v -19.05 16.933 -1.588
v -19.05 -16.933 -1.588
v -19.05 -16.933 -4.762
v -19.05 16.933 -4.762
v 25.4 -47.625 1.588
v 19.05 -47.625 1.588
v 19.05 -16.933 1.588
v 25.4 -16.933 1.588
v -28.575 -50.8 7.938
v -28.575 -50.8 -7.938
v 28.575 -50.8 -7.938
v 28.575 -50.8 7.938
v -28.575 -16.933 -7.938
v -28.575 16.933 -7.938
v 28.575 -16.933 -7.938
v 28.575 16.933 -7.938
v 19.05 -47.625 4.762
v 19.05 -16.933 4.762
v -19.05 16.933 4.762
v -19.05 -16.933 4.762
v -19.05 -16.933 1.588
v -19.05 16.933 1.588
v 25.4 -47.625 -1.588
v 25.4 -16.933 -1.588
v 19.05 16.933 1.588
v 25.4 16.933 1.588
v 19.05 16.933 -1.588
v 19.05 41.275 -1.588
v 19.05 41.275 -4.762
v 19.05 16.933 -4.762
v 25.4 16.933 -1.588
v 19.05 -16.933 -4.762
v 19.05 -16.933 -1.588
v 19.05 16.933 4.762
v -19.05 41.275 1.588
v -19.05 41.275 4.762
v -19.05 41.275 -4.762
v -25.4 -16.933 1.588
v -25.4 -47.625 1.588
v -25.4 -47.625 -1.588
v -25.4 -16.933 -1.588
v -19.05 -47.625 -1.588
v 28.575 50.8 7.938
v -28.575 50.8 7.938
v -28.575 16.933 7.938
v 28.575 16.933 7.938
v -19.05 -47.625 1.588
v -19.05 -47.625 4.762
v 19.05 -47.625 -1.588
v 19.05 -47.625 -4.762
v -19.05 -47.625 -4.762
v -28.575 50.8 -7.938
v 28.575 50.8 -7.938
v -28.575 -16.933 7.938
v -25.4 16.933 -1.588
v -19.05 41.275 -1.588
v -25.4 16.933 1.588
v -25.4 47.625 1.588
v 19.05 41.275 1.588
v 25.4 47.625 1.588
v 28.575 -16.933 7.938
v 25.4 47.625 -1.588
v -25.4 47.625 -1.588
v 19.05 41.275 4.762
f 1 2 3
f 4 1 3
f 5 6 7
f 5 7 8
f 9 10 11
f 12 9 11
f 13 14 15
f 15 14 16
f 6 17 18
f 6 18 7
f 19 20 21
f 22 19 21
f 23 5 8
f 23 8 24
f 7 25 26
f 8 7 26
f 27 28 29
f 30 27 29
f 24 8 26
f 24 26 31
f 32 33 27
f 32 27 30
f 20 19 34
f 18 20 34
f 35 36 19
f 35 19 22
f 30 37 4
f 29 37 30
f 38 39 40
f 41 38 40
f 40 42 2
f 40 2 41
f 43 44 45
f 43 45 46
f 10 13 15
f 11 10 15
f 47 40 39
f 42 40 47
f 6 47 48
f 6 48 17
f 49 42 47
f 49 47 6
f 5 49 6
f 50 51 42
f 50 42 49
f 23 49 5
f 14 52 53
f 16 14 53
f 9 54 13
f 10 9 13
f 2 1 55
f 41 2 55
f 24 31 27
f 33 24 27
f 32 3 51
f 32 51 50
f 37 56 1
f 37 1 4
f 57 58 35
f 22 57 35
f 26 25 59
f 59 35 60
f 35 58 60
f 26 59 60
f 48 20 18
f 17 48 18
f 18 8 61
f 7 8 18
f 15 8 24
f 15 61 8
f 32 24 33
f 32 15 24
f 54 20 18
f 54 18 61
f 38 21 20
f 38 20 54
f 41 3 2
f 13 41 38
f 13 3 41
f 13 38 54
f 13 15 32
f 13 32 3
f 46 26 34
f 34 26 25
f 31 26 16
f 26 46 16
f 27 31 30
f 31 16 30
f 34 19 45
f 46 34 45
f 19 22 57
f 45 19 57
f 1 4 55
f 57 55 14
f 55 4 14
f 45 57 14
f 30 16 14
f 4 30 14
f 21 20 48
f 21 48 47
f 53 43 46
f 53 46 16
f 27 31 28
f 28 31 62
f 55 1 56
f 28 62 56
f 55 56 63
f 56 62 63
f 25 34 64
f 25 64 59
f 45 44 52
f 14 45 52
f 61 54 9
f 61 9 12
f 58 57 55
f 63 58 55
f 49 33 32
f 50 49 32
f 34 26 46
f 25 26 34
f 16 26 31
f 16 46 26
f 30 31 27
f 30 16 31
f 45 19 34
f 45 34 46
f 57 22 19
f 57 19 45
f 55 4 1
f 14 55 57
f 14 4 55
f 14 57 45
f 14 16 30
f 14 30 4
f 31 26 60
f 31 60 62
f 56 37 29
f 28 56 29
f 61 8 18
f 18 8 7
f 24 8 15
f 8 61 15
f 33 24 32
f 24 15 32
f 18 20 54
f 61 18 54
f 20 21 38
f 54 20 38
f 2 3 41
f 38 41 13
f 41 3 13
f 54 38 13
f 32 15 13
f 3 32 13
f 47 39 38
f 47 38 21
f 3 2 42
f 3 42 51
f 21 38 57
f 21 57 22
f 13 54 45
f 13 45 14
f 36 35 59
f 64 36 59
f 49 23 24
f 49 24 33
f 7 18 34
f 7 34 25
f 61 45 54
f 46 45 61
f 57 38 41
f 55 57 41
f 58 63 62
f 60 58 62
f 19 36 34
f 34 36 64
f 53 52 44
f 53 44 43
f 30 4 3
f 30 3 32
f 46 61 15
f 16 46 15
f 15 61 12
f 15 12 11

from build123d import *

# Parameters (mm, degrees)
SKETCH1_W                = 57.15
SKETCH1_H                = 15.875
BOSS_EXTRUDE1_DEPTH      = 50.8
SKETCH2_W                = 6.35
SKETCH2_H                = 3.175
SKETCH2_W_2              = 38.1
CUT_EXTRUDE1_DEPTH       = 47.625
SKETCH2_3_W              = 6.35
SKETCH2_3_H              = 3.175
SKETCH2_3_W_2            = 38.1
CUT_EXTRUDE2_DEPTH       = 47.625
SKETCH2_4_W              = 38.1
SKETCH2_4_H              = 3.175
CUT_EXTRUDE3_DEPTH       = 41.275
SPLIT3_SURFACE_1_1_BACK  = 118.646
SPLIT3_SURFACE_1_1_DEPTH = 237.292
SPLIT3_SURFACE_1_2_BACK  = 118.646
SPLIT3_SURFACE_1_2_DEPTH = 237.292
SPLIT3_SURFACE_2_3_BACK  = 118.646
SPLIT3_SURFACE_2_3_DEPTH = 237.292
SPLIT3_SURFACE_2_4_BACK  = 118.646
SPLIT3_SURFACE_2_4_DEPTH = 237.292


with BuildPart() as part:
    # Sketch1 → Boss-Extrude1 (new, symmetric)
    with BuildSketch(Plane(origin=(0, 0, 0), x_dir=(1, 0, 0), z_dir=(0, 1, 0))):
        Rectangle(SKETCH1_W, SKETCH1_H)
    extrude(amount=BOSS_EXTRUDE1_DEPTH, both=True)

    # Sketch2 → Cut-Extrude1 (cut)
    with BuildSketch(Plane(origin=(0, 0, 0), x_dir=(1, 0, 0), z_dir=(0, 1, 0))):
        with Locations((-22.225, 0)):
            Rectangle(SKETCH2_W, SKETCH2_H)
        Rectangle(SKETCH2_W_2, SKETCH2_H)
        with Locations((0, 3.175)):
            Rectangle(SKETCH2_W_2, SKETCH2_H)
        with Locations((0, -3.175)):
            Rectangle(SKETCH2_W_2, SKETCH2_H)
        with Locations((22.225, 0)):
            Rectangle(SKETCH2_W, SKETCH2_H)
    extrude(amount=-CUT_EXTRUDE1_DEPTH, mode=Mode.SUBTRACT)

    # Sketch2<3> → Cut-Extrude2 (cut)
    with BuildSketch(Plane(origin=(0, 0, 0), x_dir=(1, 0, 0), z_dir=(0, 1, 0))):
        with Locations((-22.225, 0)):
            Rectangle(SKETCH2_3_W, SKETCH2_3_H)
        Rectangle(SKETCH2_3_W_2, SKETCH2_3_H)
        with Locations((22.225, 0)):
            Rectangle(SKETCH2_3_W, SKETCH2_3_H)
    extrude(amount=CUT_EXTRUDE2_DEPTH, mode=Mode.SUBTRACT)

    # Sketch2<4> → Cut-Extrude3 (cut)
    with BuildSketch(Plane(origin=(0, 0, 0), x_dir=(1, 0, 0), z_dir=(0, 1, 0))):
        with Locations((0, -3.175)):
            Rectangle(SKETCH2_4_W, SKETCH2_4_H)
        with Locations((0, 3.175)):
            Rectangle(SKETCH2_4_W, SKETCH2_4_H)
    extrude(amount=CUT_EXTRUDE3_DEPTH, mode=Mode.SUBTRACT)


with BuildPart() as body_2:
    # Split3: the piece behind the surface
    add(part.part)
    # Split3 surface 1: a surface, the sketch's curves swept straight by 237.292 mm
    with BuildLine(Plane.XY.offset(-SPLIT3_SURFACE_1_1_BACK), mode=Mode.PRIVATE) as split3_surface_1_1_path:
        Line((28.575, 16.933333333), (-28.575, 16.933333333))
    split3_surface_1_1 = Shell.extrude(split3_surface_1_1_path.wire(), (0 * SPLIT3_SURFACE_1_1_DEPTH, 0 * SPLIT3_SURFACE_1_1_DEPTH, 1 * SPLIT3_SURFACE_1_1_DEPTH))
    split(bisect_by=split3_surface_1_1, keep=Keep.BOTTOM)


with BuildPart() as part_1:
    add(part.part)

    # Split3: split by a surface, the side it looks to stays
    # Split3 surface 1: a surface, the sketch's curves swept straight by 237.292 mm
    with BuildLine(Plane.XY.offset(-SPLIT3_SURFACE_1_2_BACK), mode=Mode.PRIVATE) as split3_surface_1_2_path:
        Line((28.575, 16.933333333), (-28.575, 16.933333333))
    split3_surface_1_2 = Shell.extrude(split3_surface_1_2_path.wire(), (0 * SPLIT3_SURFACE_1_2_DEPTH, 0 * SPLIT3_SURFACE_1_2_DEPTH, 1 * SPLIT3_SURFACE_1_2_DEPTH))
    split(bisect_by=split3_surface_1_2, keep=Keep.TOP)


with BuildPart() as body_3:
    # Split3 2: the piece behind the surface
    add(part_1.part)
    # Split3 surface 2: a surface, the sketch's curves swept straight by 237.292 mm
    with BuildLine(Plane.XY.offset(-SPLIT3_SURFACE_2_3_BACK), mode=Mode.PRIVATE) as split3_surface_2_3_path:
        Line((28.575, -16.933333333), (-28.575, -16.933333333))
    split3_surface_2_3 = Shell.extrude(split3_surface_2_3_path.wire(), (0 * SPLIT3_SURFACE_2_3_DEPTH, 0 * SPLIT3_SURFACE_2_3_DEPTH, 1 * SPLIT3_SURFACE_2_3_DEPTH))
    split(bisect_by=split3_surface_2_3, keep=Keep.BOTTOM)


with BuildPart() as part_2:
    add(part_1.part)

    # Split3 2: split by a surface, the side it looks to stays
    # Split3 surface 2: a surface, the sketch's curves swept straight by 237.292 mm
    with BuildLine(Plane.XY.offset(-SPLIT3_SURFACE_2_4_BACK), mode=Mode.PRIVATE) as split3_surface_2_4_path:
        Line((28.575, -16.933333333), (-28.575, -16.933333333))
    split3_surface_2_4 = Shell.extrude(split3_surface_2_4_path.wire(), (0 * SPLIT3_SURFACE_2_4_DEPTH, 0 * SPLIT3_SURFACE_2_4_DEPTH, 1 * SPLIT3_SURFACE_2_4_DEPTH))
    split(bisect_by=split3_surface_2_4, keep=Keep.TOP)


solid = Compound([body_2.part, body_3.part, part_2.part])
